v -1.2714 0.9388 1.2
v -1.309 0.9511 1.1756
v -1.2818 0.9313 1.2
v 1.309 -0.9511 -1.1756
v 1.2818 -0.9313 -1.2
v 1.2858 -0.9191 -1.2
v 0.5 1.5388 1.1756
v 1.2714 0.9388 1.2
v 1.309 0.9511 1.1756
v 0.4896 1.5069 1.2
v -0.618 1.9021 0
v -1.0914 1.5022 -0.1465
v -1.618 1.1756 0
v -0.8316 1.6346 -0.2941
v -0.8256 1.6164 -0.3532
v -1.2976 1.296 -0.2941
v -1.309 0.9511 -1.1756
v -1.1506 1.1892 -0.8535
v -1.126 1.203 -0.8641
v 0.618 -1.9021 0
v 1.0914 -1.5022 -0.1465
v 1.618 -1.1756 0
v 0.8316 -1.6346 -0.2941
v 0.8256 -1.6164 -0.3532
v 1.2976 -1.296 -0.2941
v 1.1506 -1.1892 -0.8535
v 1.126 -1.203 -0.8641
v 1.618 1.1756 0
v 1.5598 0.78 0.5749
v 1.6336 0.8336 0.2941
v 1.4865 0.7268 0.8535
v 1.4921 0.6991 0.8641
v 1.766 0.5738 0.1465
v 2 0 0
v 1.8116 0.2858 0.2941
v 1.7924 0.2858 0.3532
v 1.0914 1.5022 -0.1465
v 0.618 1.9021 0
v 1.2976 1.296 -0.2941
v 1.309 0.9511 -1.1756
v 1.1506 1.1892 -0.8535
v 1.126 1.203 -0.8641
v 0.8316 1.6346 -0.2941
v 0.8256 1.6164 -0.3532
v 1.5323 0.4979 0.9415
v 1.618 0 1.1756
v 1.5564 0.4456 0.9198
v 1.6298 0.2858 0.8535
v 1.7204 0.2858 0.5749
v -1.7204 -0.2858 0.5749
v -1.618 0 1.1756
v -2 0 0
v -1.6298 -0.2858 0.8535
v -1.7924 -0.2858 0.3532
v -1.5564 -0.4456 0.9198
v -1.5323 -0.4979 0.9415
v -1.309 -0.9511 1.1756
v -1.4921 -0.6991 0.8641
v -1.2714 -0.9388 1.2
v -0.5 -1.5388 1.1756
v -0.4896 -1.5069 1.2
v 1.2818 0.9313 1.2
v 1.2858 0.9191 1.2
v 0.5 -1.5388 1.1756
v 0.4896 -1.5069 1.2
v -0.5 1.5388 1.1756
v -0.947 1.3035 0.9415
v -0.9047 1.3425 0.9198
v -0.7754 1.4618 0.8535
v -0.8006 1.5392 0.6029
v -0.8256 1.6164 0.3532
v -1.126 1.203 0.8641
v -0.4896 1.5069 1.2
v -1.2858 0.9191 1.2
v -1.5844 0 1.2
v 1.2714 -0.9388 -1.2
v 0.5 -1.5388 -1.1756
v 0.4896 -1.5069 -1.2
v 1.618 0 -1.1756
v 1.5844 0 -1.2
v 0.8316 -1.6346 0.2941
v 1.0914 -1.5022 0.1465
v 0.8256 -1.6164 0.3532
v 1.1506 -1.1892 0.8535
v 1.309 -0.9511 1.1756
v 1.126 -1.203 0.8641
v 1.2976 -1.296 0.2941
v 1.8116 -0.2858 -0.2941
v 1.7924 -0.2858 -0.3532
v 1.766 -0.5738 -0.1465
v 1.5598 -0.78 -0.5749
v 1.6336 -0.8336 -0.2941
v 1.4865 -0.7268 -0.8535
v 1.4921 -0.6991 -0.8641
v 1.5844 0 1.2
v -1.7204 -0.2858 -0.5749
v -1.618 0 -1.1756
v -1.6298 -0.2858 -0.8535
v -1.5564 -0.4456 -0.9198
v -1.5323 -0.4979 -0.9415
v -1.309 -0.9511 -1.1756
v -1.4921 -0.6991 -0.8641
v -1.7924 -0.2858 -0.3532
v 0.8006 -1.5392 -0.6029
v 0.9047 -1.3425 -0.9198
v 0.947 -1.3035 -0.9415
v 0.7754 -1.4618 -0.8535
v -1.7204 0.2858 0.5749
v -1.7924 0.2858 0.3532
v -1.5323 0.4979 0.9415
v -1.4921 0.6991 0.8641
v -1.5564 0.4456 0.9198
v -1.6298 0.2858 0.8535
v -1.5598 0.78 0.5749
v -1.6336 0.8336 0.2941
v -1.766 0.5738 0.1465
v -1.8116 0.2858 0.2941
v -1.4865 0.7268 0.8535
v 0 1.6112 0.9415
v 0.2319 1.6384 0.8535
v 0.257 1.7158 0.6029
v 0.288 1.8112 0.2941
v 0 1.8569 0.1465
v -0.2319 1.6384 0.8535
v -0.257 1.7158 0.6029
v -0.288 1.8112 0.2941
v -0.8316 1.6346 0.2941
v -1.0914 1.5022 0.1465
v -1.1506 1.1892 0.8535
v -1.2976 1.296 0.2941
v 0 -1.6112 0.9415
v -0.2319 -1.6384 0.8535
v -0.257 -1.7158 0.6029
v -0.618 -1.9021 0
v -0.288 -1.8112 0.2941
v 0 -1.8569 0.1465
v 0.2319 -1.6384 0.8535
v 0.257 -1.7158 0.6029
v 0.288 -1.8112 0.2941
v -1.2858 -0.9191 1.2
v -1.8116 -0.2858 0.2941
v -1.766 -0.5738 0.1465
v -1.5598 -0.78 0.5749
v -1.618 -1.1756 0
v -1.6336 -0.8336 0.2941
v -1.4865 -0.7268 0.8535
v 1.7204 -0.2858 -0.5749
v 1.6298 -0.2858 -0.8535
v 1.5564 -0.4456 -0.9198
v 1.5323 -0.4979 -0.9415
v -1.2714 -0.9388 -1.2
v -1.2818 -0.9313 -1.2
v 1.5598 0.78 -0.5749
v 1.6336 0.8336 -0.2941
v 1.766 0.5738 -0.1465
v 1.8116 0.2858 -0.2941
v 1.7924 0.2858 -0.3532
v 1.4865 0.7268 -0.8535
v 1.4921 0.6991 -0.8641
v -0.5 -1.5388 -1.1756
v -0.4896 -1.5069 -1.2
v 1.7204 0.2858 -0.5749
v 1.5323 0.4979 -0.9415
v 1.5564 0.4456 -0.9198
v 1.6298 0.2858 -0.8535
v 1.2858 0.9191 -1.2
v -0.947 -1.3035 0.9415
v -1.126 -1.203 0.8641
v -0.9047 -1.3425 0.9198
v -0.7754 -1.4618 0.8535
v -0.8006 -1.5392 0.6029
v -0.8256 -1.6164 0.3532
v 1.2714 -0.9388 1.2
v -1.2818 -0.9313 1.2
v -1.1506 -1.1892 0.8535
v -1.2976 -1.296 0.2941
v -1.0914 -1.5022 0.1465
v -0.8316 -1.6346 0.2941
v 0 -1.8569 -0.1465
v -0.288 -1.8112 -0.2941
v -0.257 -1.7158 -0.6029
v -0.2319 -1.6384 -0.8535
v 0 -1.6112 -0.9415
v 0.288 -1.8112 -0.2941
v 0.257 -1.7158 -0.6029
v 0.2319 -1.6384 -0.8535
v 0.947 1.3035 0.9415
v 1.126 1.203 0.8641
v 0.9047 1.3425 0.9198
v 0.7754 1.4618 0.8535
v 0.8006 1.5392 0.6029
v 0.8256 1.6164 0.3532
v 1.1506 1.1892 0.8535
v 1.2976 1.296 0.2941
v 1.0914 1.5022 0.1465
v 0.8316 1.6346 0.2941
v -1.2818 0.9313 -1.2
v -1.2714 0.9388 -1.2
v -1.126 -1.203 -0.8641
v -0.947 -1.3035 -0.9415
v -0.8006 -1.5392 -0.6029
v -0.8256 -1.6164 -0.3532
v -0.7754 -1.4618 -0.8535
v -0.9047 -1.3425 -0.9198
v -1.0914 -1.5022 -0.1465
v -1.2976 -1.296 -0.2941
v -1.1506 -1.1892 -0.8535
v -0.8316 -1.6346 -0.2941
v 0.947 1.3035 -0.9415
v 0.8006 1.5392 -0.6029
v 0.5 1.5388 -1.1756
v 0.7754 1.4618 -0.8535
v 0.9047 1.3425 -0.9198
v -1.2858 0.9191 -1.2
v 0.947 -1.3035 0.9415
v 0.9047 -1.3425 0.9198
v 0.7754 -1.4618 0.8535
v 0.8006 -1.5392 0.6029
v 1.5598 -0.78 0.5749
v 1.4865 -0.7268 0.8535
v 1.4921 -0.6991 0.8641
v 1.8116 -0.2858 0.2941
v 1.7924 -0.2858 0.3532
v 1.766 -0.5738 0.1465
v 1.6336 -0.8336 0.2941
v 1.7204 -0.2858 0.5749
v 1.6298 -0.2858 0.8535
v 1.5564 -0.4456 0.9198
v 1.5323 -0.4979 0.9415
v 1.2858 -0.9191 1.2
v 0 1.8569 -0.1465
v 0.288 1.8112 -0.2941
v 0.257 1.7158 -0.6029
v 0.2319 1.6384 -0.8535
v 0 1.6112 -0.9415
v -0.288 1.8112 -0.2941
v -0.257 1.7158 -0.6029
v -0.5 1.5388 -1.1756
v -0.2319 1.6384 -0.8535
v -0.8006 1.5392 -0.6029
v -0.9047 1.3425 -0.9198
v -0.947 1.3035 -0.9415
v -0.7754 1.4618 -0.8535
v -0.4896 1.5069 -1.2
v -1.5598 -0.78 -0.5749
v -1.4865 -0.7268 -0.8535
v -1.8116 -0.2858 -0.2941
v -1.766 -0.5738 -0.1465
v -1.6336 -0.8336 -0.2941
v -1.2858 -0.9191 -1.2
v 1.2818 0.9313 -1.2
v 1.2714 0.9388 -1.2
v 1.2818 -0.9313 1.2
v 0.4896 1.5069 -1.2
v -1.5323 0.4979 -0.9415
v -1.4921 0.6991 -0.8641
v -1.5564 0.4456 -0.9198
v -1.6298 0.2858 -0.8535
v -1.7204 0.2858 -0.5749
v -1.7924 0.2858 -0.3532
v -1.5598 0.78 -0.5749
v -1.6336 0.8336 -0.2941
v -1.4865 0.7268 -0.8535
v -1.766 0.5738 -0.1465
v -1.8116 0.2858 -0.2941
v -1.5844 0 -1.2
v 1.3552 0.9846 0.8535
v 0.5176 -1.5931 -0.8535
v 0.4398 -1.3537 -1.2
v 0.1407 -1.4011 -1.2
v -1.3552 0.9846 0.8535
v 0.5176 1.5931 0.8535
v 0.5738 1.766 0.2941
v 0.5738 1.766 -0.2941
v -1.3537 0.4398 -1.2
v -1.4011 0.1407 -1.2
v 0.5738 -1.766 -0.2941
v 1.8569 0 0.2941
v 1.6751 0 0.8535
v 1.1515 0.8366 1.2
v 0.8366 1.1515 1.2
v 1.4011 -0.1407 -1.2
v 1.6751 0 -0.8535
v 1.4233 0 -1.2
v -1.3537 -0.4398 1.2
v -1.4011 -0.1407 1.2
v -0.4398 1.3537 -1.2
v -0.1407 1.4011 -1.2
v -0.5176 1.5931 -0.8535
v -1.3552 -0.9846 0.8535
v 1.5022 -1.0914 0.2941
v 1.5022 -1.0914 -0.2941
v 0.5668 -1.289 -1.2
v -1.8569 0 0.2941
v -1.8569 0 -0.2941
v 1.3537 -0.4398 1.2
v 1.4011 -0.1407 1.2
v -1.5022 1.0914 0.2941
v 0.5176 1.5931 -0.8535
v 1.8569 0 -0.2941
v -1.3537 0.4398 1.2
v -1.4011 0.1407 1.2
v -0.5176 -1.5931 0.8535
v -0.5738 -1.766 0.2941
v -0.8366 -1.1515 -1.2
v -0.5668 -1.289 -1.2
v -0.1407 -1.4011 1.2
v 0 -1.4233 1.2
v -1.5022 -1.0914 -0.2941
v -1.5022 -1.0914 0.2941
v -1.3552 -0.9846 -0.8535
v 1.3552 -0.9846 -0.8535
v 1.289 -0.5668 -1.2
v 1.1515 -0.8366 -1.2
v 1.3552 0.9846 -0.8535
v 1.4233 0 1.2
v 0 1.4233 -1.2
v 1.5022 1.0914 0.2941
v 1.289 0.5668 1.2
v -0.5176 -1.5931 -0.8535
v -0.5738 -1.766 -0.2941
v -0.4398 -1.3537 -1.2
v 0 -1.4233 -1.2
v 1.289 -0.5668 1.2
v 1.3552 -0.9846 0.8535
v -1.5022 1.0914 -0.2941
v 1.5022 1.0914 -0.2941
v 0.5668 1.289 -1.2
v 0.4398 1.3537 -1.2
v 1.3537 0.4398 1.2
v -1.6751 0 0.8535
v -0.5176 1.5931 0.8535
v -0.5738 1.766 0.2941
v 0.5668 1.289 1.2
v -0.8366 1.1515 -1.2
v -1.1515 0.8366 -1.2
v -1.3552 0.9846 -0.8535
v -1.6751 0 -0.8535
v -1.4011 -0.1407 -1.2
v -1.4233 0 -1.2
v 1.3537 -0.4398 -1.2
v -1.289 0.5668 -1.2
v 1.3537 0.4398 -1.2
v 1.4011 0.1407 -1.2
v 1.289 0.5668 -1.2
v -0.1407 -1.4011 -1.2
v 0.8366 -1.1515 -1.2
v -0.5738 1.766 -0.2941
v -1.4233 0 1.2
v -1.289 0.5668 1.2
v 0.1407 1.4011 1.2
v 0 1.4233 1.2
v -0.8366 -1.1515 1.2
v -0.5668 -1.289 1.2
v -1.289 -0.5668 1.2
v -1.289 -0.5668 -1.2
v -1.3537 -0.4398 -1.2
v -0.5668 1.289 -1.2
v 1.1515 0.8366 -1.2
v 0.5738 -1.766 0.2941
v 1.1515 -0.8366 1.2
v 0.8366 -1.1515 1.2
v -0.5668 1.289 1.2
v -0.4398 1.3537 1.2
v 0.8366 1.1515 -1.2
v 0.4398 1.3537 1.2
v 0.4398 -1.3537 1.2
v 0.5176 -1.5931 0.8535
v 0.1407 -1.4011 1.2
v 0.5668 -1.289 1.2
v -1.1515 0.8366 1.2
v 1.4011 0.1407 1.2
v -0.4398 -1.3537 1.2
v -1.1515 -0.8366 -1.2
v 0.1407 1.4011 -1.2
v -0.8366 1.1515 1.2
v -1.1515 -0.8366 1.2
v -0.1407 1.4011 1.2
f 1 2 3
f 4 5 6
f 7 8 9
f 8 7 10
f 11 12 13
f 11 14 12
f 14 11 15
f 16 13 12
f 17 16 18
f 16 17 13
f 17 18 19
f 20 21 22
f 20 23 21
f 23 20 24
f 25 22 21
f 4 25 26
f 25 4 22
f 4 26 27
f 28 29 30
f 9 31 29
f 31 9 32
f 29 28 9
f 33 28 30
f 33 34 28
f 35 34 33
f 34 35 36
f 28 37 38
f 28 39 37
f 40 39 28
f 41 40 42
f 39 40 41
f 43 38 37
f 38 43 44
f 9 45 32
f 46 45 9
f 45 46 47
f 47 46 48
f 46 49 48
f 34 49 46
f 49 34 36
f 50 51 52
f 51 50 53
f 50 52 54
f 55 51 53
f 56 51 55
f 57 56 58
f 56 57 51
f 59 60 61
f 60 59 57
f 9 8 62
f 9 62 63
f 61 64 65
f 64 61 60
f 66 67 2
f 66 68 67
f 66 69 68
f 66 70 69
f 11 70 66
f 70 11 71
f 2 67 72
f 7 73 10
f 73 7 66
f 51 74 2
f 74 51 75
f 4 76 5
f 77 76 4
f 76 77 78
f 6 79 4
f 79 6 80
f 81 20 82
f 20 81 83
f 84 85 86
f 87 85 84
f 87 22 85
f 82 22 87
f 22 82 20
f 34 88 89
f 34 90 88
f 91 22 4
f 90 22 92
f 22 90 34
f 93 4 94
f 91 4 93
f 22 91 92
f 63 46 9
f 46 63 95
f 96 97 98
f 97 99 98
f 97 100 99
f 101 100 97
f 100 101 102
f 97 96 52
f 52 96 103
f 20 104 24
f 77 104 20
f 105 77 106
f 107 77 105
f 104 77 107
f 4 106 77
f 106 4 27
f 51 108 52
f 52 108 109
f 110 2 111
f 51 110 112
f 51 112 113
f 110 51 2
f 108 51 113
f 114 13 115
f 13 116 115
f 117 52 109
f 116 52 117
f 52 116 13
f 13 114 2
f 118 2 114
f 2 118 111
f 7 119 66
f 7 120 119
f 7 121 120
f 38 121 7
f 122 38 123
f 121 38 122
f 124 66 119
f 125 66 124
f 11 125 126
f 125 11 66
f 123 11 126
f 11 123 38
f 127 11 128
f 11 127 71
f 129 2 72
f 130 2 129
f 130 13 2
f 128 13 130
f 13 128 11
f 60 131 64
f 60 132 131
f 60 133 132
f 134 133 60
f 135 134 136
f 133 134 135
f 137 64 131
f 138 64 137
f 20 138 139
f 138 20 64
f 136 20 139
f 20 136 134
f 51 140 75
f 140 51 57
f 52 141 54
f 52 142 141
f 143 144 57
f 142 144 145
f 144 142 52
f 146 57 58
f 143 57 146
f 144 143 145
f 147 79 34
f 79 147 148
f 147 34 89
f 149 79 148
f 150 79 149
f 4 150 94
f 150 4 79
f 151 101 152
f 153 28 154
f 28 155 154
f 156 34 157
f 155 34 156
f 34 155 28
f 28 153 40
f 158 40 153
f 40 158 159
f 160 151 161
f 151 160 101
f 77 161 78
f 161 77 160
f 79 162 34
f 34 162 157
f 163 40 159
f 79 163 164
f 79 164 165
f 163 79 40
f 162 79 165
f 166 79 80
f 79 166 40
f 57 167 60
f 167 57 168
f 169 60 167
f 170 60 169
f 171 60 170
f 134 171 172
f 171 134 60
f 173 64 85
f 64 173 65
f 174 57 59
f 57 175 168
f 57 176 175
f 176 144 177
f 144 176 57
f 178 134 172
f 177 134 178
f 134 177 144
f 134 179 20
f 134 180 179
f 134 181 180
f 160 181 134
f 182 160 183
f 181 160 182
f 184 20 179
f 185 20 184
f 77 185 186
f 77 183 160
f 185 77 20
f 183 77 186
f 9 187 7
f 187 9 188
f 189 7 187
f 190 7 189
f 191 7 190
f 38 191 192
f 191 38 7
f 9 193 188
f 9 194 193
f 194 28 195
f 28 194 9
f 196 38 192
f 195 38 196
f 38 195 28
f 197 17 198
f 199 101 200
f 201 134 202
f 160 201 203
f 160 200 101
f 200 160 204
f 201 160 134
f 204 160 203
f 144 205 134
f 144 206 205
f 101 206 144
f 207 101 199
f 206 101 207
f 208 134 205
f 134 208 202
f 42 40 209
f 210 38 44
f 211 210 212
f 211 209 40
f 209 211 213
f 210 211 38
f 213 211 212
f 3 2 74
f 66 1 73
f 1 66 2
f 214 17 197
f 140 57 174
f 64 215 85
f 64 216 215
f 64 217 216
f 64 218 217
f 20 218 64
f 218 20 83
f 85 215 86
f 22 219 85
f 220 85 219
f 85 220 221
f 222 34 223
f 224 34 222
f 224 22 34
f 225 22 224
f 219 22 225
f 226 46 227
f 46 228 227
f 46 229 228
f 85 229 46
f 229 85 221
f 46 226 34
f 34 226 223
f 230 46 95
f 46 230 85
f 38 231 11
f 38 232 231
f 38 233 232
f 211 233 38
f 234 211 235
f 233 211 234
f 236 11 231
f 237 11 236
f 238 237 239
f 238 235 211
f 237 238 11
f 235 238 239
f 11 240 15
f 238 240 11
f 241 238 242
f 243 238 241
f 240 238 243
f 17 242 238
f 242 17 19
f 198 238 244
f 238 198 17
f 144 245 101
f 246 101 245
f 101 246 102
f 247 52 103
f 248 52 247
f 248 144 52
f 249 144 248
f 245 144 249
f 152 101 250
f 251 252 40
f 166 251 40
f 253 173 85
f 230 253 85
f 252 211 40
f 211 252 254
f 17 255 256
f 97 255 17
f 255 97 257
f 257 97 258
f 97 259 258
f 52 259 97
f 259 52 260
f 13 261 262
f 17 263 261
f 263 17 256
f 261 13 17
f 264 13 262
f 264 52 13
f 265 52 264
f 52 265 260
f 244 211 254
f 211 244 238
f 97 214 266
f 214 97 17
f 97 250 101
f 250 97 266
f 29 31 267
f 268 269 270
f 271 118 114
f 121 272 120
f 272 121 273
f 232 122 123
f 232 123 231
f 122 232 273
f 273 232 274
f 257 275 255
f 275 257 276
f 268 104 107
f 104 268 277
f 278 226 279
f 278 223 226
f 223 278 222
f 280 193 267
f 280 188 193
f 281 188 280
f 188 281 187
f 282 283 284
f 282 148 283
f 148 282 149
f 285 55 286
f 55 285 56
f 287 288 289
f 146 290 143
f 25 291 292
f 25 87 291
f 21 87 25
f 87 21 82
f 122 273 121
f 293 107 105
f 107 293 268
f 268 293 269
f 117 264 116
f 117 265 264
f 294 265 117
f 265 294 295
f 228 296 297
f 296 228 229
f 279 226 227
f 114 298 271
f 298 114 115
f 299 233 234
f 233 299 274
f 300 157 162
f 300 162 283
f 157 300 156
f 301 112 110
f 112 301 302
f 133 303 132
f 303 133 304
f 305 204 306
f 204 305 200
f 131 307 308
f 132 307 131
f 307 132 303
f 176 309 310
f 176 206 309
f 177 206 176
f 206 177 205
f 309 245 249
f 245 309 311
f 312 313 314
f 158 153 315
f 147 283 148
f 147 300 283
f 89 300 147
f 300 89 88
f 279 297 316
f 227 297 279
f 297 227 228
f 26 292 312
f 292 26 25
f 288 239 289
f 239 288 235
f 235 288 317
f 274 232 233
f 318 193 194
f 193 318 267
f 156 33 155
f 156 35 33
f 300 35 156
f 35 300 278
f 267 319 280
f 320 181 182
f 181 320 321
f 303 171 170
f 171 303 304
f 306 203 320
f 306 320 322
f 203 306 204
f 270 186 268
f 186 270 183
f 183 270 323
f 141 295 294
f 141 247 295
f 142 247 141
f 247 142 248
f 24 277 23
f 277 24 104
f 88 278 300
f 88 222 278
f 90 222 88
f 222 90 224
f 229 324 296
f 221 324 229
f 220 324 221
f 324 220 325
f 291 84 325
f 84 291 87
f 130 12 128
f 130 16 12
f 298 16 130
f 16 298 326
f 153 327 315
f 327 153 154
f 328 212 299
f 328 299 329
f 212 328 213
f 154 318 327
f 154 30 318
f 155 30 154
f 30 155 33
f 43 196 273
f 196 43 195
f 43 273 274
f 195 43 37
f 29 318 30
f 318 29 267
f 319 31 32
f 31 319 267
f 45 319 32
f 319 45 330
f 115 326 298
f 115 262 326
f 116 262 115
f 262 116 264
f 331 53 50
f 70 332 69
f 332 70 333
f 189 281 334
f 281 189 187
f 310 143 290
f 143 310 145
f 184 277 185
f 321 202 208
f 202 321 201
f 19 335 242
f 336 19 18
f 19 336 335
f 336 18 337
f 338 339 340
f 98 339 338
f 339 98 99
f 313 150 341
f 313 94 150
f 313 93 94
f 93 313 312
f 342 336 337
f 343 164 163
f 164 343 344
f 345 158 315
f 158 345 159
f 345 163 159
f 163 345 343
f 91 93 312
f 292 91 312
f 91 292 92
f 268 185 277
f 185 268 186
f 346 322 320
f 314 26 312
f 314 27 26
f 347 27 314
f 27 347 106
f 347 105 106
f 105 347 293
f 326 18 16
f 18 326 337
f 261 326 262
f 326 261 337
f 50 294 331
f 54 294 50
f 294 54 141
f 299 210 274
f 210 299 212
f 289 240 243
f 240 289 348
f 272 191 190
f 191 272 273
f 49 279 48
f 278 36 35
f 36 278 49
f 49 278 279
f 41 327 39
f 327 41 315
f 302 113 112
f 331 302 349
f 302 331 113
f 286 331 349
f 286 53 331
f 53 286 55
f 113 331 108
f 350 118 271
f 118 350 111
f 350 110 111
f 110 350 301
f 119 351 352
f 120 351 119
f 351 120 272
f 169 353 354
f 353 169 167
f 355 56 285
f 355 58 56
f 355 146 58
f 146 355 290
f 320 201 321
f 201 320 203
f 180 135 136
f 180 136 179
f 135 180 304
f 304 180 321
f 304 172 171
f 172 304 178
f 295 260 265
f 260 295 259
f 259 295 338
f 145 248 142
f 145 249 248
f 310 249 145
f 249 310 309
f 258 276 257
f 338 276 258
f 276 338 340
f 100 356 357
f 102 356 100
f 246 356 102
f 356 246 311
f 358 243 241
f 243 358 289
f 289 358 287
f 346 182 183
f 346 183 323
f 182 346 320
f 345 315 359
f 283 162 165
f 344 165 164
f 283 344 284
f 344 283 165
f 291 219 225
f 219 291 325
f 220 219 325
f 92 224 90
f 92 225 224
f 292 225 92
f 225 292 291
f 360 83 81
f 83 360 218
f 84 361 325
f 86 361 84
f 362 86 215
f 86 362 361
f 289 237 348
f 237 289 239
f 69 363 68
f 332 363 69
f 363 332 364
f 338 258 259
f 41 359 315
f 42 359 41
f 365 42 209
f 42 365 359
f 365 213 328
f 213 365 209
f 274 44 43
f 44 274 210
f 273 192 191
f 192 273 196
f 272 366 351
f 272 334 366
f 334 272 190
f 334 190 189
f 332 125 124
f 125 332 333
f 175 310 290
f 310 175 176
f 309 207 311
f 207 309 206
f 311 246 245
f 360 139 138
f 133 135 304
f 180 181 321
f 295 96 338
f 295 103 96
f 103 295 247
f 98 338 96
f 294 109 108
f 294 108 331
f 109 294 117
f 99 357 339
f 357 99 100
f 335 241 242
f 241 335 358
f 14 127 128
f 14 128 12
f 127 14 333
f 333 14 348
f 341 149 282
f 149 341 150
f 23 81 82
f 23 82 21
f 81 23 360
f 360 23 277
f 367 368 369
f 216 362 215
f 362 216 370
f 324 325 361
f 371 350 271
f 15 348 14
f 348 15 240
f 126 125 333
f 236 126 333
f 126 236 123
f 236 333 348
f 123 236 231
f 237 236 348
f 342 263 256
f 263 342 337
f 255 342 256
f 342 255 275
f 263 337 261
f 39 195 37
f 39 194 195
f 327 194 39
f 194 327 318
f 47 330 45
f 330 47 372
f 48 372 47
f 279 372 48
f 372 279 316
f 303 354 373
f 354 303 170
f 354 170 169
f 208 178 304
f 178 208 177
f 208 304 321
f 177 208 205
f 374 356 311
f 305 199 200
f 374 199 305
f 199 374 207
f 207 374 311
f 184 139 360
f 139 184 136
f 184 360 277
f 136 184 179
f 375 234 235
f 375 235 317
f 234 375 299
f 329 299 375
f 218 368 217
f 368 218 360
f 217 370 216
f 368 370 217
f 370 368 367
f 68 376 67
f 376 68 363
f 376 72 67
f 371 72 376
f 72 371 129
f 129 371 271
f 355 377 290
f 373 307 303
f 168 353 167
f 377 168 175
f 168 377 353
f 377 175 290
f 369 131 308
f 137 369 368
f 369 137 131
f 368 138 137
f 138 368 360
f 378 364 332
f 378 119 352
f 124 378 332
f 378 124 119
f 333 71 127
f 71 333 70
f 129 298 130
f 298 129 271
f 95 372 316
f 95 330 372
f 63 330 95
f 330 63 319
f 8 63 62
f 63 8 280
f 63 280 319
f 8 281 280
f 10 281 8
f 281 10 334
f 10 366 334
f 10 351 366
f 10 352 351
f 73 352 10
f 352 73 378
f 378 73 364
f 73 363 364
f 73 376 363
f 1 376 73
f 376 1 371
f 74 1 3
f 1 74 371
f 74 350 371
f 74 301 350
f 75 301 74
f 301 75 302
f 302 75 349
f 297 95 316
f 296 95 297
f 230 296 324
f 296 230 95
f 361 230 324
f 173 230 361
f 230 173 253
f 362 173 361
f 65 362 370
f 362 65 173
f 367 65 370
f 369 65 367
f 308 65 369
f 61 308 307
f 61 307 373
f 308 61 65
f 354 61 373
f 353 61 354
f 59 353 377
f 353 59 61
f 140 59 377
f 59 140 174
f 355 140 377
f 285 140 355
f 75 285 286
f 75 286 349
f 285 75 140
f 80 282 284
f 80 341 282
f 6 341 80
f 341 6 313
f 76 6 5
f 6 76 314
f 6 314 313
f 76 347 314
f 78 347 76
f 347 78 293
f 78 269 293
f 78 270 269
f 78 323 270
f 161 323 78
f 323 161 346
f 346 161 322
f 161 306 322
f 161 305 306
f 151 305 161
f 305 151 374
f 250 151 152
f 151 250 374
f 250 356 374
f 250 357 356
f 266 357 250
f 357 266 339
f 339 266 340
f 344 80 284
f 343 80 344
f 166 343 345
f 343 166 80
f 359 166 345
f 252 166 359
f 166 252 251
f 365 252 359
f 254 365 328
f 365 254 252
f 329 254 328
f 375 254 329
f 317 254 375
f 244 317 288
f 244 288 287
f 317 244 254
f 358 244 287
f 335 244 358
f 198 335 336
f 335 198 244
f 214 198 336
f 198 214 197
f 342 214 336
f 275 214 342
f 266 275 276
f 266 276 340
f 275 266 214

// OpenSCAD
difference(){
  sphere(r = 2, $fn=10);
  sphere(r = 1.88, $fn=20);
  translate([-2,-2,1.2]) cube([5,5,2]);
  translate([-2,-2,-3.2]) cube([5,5,2]);
}
